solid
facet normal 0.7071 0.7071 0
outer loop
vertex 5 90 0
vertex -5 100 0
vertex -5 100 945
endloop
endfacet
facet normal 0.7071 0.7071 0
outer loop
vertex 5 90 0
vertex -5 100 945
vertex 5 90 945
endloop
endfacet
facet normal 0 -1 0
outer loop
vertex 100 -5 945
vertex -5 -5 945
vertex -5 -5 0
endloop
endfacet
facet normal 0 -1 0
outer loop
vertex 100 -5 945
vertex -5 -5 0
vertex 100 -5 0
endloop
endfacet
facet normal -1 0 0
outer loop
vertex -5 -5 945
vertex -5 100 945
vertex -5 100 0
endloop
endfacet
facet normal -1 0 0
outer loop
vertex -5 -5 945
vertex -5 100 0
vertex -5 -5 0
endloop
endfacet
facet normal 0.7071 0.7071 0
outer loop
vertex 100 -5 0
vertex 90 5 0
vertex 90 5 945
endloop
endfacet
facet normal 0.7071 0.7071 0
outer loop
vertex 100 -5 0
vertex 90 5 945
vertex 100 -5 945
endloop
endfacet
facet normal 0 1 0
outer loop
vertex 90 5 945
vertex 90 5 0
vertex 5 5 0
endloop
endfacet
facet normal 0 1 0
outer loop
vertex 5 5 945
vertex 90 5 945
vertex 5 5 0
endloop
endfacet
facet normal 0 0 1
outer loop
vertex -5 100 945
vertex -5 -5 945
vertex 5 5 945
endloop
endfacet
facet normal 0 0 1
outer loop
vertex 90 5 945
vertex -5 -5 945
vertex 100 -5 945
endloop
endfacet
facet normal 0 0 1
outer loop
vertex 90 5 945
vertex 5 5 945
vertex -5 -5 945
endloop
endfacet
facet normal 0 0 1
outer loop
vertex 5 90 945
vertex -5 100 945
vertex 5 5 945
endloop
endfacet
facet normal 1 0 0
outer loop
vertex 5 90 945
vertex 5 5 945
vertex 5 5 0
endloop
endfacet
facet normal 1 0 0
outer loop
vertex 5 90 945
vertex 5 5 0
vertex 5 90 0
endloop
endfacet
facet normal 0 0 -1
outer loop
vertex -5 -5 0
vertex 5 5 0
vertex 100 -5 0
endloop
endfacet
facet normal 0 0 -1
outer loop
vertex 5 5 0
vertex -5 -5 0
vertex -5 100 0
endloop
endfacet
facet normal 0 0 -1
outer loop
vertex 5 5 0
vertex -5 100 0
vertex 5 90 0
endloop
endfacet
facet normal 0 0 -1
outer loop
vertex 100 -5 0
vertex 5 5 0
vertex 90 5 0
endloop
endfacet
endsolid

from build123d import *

# Parameters (mm, degrees)
BOSS_EXTRUDE1_DEPTH = 945
CUT_EXTRUDE1_DEPTH  = 956.523416772


with BuildPart() as part:
    # Sketch1 → Boss-Extrude1 (new body)
    with BuildSketch(Plane.XY):
        Polygon((-5, 100), (-5, -5), (100, -5), (100, 5), (5, 5), (5, 100), align=None)
    extrude(amount=BOSS_EXTRUDE1_DEPTH)

    # Sketch2 → Cut-Extrude1 (cut, through all)
    with BuildSketch(Plane.XY.offset(945)):
        Polygon((-5, 100), (100, -5), (100, 5), (5, 100), align=None)
    extrude(amount=-CUT_EXTRUDE1_DEPTH, mode=Mode.SUBTRACT)


solid = part.part
